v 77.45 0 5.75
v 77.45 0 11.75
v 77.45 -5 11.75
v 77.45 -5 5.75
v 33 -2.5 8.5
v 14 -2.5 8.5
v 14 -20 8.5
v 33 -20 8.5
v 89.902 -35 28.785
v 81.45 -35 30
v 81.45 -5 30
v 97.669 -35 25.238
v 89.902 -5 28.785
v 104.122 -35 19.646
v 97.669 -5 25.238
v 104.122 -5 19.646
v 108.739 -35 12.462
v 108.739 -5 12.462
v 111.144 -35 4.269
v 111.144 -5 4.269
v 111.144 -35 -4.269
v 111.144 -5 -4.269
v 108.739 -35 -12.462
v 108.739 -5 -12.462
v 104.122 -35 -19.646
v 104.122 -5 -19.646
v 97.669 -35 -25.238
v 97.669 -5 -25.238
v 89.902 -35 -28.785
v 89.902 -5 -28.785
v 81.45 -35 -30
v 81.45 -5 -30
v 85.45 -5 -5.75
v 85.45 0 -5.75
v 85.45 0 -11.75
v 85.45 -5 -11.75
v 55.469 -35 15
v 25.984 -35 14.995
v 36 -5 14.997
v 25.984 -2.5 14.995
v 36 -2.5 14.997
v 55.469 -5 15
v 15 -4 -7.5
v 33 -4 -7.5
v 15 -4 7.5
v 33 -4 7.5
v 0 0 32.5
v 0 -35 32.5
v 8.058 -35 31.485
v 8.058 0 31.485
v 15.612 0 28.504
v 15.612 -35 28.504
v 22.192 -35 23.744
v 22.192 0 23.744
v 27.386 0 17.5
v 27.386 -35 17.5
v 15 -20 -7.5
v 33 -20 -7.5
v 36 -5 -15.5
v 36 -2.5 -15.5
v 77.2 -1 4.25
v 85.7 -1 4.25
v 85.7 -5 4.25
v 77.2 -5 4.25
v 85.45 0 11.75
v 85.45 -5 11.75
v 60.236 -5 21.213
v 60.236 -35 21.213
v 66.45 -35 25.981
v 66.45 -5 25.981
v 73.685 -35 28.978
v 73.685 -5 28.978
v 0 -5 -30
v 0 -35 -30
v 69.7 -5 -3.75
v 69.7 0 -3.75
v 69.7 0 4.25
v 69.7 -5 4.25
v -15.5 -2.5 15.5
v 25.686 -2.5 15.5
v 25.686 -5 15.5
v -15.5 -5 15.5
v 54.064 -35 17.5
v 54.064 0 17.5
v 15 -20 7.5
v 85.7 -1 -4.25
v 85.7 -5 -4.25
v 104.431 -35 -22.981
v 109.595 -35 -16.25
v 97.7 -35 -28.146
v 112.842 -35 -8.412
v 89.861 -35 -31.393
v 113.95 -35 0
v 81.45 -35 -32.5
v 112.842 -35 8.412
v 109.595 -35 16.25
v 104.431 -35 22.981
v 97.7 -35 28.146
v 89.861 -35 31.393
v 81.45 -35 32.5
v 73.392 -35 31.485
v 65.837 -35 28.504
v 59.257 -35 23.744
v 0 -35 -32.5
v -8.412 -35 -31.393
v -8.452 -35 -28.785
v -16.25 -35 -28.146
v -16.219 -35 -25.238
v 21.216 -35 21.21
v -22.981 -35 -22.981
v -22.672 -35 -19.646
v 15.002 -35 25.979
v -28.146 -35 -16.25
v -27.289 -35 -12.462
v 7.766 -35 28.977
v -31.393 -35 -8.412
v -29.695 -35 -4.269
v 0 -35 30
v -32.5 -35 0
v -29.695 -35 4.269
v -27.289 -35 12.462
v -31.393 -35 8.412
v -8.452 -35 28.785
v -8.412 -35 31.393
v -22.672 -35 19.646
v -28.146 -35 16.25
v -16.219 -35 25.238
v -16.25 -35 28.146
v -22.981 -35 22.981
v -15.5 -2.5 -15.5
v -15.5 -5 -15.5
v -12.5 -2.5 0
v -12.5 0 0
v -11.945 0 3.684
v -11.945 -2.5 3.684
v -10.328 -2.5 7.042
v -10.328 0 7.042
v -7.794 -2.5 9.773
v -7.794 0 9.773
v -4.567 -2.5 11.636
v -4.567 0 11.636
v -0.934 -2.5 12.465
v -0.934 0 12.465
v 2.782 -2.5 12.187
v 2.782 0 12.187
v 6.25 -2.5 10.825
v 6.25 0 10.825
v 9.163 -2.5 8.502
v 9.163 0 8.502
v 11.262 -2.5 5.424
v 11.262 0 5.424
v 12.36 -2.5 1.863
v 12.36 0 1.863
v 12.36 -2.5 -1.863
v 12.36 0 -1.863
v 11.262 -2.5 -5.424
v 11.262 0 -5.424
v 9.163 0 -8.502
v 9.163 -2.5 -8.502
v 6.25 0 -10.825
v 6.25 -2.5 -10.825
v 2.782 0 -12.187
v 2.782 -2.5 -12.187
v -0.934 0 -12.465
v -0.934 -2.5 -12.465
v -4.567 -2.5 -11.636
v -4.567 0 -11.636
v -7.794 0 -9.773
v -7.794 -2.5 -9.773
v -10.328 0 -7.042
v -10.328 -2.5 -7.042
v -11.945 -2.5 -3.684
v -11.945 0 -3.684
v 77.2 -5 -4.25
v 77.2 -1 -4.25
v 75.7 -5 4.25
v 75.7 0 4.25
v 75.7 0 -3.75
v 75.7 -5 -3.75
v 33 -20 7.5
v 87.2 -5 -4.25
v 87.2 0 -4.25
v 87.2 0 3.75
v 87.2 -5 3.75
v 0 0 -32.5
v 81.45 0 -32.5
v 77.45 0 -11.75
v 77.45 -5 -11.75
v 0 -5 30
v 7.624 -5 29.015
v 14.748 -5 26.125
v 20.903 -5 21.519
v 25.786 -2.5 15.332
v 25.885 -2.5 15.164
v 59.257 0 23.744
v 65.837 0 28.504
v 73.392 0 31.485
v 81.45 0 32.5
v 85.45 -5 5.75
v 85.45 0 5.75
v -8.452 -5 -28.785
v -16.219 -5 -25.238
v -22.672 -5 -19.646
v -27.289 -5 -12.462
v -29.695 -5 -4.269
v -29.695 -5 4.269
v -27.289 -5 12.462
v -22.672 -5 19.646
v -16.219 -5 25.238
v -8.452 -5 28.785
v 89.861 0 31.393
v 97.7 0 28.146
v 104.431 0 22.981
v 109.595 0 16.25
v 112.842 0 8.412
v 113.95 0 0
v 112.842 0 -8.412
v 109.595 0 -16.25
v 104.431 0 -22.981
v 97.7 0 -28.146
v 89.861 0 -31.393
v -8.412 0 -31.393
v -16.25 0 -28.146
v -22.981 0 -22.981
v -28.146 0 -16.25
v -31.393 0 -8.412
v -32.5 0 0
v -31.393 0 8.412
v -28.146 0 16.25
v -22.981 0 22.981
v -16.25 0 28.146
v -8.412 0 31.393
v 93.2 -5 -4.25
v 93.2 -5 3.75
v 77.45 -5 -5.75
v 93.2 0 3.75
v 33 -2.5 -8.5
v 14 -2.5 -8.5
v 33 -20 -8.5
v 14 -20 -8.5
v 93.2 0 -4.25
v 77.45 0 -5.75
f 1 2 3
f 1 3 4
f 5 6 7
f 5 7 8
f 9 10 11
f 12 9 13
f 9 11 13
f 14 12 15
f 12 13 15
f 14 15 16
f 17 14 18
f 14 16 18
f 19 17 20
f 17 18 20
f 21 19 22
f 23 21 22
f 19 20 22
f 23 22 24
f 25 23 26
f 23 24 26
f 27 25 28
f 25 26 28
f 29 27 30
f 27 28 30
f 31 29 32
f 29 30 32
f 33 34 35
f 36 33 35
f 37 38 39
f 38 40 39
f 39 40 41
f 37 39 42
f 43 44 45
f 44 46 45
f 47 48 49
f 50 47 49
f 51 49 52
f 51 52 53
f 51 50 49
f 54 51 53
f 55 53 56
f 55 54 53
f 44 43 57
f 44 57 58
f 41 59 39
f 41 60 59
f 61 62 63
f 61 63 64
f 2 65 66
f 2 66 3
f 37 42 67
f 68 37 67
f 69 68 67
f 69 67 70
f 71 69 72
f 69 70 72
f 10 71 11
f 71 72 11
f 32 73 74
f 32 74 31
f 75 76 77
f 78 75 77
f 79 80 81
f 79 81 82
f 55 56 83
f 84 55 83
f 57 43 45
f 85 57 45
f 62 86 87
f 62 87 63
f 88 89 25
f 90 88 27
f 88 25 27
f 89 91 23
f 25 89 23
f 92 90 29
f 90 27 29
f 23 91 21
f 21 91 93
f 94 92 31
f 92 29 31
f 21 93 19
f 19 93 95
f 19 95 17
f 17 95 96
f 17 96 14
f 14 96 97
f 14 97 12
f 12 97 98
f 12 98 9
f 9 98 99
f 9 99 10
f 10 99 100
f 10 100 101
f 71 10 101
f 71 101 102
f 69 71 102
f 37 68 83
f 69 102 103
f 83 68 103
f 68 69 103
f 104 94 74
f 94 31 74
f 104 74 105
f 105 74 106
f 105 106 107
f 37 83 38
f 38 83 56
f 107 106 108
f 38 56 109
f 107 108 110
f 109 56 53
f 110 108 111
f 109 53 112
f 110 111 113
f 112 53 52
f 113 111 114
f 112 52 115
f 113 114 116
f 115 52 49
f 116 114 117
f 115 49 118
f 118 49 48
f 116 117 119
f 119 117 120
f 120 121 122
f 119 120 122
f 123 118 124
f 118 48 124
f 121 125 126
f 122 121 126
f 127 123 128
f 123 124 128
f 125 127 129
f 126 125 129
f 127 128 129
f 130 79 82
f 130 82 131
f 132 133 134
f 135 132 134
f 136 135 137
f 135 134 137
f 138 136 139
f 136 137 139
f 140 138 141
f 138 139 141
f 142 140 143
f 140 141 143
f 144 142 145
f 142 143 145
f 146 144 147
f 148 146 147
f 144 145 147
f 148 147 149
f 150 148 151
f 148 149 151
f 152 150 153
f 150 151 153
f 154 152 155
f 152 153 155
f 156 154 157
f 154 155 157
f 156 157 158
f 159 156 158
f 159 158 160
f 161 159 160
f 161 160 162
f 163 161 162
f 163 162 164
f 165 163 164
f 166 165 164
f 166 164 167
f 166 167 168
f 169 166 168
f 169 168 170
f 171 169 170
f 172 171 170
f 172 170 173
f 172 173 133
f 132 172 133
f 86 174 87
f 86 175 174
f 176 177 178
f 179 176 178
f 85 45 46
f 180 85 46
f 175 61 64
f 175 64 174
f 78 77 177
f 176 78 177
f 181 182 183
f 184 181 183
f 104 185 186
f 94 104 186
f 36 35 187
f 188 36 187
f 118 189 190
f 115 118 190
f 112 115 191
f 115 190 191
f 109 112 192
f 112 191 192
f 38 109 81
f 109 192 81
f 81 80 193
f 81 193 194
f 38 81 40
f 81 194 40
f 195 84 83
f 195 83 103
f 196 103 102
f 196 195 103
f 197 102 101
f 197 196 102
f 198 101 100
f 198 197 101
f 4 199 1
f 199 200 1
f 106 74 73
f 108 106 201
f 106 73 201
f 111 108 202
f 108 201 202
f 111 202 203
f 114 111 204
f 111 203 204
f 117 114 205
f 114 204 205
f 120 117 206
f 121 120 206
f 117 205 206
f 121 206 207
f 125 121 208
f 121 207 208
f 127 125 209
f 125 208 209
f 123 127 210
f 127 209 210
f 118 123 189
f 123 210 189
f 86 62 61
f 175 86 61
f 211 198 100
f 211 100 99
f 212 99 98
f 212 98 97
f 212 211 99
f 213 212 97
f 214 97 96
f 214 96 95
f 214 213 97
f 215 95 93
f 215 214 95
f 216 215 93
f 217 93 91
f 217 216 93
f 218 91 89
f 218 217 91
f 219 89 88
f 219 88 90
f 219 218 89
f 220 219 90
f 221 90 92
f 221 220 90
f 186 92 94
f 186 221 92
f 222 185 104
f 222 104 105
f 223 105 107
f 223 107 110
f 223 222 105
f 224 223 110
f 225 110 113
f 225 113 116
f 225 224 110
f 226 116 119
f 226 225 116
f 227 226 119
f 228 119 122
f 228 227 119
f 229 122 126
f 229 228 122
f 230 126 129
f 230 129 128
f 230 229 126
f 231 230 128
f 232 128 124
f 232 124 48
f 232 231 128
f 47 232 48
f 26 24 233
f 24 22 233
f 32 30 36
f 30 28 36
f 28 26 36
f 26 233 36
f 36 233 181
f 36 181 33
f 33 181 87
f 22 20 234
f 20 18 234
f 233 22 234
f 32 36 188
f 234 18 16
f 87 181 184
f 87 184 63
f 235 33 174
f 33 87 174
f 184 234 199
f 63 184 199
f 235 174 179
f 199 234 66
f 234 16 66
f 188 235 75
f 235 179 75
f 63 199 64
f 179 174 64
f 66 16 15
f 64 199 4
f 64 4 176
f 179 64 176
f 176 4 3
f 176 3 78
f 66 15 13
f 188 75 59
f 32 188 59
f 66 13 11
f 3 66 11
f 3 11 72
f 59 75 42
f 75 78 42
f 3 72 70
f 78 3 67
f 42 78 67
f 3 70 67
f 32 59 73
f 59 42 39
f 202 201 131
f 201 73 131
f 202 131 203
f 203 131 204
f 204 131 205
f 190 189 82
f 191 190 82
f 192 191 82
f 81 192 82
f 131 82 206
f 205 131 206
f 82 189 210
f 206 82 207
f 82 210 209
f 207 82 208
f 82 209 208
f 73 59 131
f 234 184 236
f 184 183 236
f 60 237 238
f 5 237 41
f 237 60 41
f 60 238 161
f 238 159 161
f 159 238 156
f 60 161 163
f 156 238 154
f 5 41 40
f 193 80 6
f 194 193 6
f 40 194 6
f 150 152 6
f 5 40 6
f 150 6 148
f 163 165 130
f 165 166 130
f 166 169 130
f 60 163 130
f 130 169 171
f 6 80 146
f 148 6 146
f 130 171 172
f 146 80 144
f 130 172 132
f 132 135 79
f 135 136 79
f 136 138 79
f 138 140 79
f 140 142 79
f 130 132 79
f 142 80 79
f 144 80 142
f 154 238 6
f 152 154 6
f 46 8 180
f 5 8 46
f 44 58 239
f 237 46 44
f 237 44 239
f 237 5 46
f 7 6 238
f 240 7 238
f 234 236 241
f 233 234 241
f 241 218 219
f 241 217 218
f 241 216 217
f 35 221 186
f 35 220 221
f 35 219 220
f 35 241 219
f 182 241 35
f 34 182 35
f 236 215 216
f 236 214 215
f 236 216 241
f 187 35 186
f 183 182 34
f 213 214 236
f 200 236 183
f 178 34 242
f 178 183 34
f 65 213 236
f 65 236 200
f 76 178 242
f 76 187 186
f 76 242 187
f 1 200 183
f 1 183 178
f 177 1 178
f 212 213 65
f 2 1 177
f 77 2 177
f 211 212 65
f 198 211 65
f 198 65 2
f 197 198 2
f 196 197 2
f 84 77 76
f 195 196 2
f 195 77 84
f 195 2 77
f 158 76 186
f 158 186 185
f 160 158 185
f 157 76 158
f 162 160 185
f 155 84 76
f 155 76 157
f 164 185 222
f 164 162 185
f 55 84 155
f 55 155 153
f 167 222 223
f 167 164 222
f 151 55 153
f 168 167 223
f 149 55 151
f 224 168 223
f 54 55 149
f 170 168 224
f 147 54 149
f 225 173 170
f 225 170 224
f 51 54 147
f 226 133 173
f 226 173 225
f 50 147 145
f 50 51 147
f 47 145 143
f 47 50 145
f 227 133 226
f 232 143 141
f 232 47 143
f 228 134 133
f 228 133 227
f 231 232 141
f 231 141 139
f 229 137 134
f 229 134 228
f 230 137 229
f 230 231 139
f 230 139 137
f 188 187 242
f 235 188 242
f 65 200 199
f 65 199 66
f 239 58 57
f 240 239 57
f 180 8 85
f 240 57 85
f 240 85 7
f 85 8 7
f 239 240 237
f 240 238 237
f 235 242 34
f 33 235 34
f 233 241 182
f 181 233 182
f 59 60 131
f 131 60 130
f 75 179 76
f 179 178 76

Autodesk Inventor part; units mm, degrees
ref_plane "YZ Plane" through (0, 0, 0) normal (1, 0, 0) x (0, 1, 0)
ref_plane "XZ Plane" through (0, 0, 0) normal (0, 1, 0) x (-1, 0, 0)
ref_plane "XY Plane" through (0, 0, 0) normal (0, 0, 1) x (1, 0, 0)
sketch "Sketch1" plane through (0, 0, 0) normal (0, 1, 0) x (-1, 0, 0)
  circle A0 centre (0, 0) radius 30 construction
  circle A1 centre (0, 0) radius 32.5 construction
  line L0 (0, -30) -> (-81.4496, -30) construction
  circle A2 centre (-81.4496, 0) radius 30 construction
  circle A3 centre (-81.4496, 0) radius 32.5 construction
  line L1 (0, -32.5) -> (-81.4496, -32.5) construction
  line L2 (0, 32.5) -> (-81.4496, 32.5) construction
  line L3 (0, 30) -> (-81.4496, 30) construction
  line L4 (-40.7248, -32.5) -> (-40.7248, 32.5) construction
  line L5 (-40.7248, 30) -> (-40.7248, 14.2852) construction
  line L6 (-81.4496, -30) -> (-81.4496, 30) construction
  line L7 (-40.7248, 14.2852) -> (-40.7248, 16.7852) construction
  arc A4 (0, -30) -> (30, 0) centre (0, 0) ccw
  arc A5 (30, 0) -> (0, 30) centre (0, 0) ccw
  arc A6 (-111.4496, 0) -> (-81.4496, -30) centre (-81.4496, 0) ccw
  arc A7 (-81.4496, 30) -> (-111.4496, 0) centre (-81.4496, 0) ccw
  arc A8 (0, -32.5) -> (32.5, 0) centre (0, 0) ccw
  arc A9 (32.5, 0) -> (0, 32.5) centre (0, 0) ccw
  arc A10 (-81.4496, 32.5) -> (-113.9496, 0) centre (-81.4496, 0) ccw
  arc A11 (-113.9496, 0) -> (-81.4496, -32.5) centre (-81.4496, 0) ccw
  line L8 (0, -30) -> (-81.4496, -30)
  line L9 (0, -32.5) -> (-81.4496, -32.5)
  line L10 (-40.7248, -30) -> (-40.7248, 15) construction
  line L11 (-40.7248, 15) -> (-28.8314, 15) construction
  line L12 (-40.7248, 15) -> (-52.6182, 15) construction
  line L13 (-40.7248, 15) -> (-40.7248, 17.5) construction
  line L14 (-40.7248, 17.5) -> (-27.3861, 17.5)
  line L15 (-40.7248, 17.5) -> (-54.0635, 17.5)
  line L16 (-52.6182, 15) -> (-55.4688, 15) construction
  line L17 (-28.8314, 15) -> (-25.9836, 15) construction
  arc A12 (0, 30) -> (-25.9836, 14.9951) centre (0, 0) ccw
  arc A13 (-55.4688, 15) -> (-81.4496, 30) centre (-81.4496, 0) ccw
  line L18 (-25.9836, 14.9951) -> (-55.4688, 15)
  arc A14 (0, 32.5) -> (-27.3861, 17.5) centre (0, 0) ccw
  arc A15 (-54.0635, 17.5) -> (-81.4496, 32.5) centre (-81.4496, 0) ccw
  circle A16 centre (0, 0) radius 12.5
  line L19 (-81.4496, 0) -> (-81.4496, -4.25) construction
  line L20 (-81.4496, 0) -> (-81.4496, 4.25) construction
  line L21 (-81.4496, 0) -> (-77.1996, 0) construction
  line L22 (-81.4496, 0) -> (-85.6996, 0) construction
  line L23 (-77.1996, 0) -> (-77.1996, -4.25)
  line L24 (-77.1996, -4.25) -> (-85.6996, -4.25)
  line L25 (-85.6996, -4.25) -> (-85.6996, 4.25)
  line L26 (-85.6996, 4.25) -> (-77.1996, 4.25)
  line L27 (-77.1996, 4.25) -> (-77.1996, 0)
  line L28 (-81.4496, -4.25) -> (-81.4496, -5.75) construction
  line L29 (-85.6996, 0) -> (-87.1996, 0) construction
  line L30 (-81.4496, 4.25) -> (-81.4496, 5.75) construction
  line L31 (-77.1996, 0) -> (-75.6996, 0) construction
  line L32 (-77.1996, 4.25) -> (-75.6996, 4.25) construction
  line L33 (-75.6996, 4.25) -> (-75.6996, -3.75)
  line L34 (-75.6996, -3.75) -> (-69.6996, -3.75)
  line L35 (-69.6996, -3.75) -> (-69.6996, 4.25)
  line L36 (-69.6996, 4.25) -> (-75.6996, 4.25)
  line L37 (-87.1996, -4.25) -> (-87.1996, 3.75)
  line L38 (-87.1996, 3.75) -> (-93.1996, 3.75)
  line L39 (-93.1996, 3.75) -> (-93.1996, -4.25)
  line L40 (-93.1996, -4.25) -> (-87.1996, -4.25)
  line L41 (-81.4496, -5.75) -> (-77.4496, -5.75)
  line L42 (-81.4496, -5.75) -> (-85.4496, -5.75)
  line L43 (-85.4496, -5.75) -> (-85.4496, -11.75)
  line L44 (-85.4496, -11.75) -> (-77.4496, -11.75)
  line L45 (-77.4496, -11.75) -> (-77.4496, -5.75)
  line L46 (-81.4496, 5.75) -> (-77.4496, 5.75)
  line L47 (-81.4496, 5.75) -> (-85.4496, 5.75)
  line L48 (-85.4496, 5.75) -> (-85.4496, 11.75)
  line L49 (-85.4496, 11.75) -> (-77.4496, 11.75)
  line L50 (-77.4496, 11.75) -> (-77.4496, 5.75)
  line L51 (0, 0) -> (-16, 0) construction
  line L52 (0, 0) -> (-15, 0) construction
  line L53 (0, 0) -> (-14, 0) construction
  line L54 (0, 12.5) -> (-16, 12.5) construction
  line L55 (0, -12.5) -> (-16, -12.5) construction
  line L56 (-15, 0) -> (-15, 12.5) construction
  line L57 (-15, 0) -> (-15, -12.5) construction
  line L58 (-14, 0) -> (-14, -12.5) construction
  line L59 (-14, 0) -> (-14, 12.5) construction
  line L60 (-16, 12.5) -> (-16, 0) construction
  line L61 (-16, 0) -> (-16, -12.5) construction
  line L62 (-16, -12.5) -> (-16, -8.5) construction
  line L63 (-16, 12.5) -> (-16, 8.5) construction
  line L64 (-14, -12.5) -> (-14, -8.5) construction
  line L65 (-14, 12.5) -> (-14, 8.5) construction
  line L66 (-14, -8.5) -> (-33, -8.5)
  line L67 (-14, 8.5) -> (-14, -8.5)
  line L68 (-14, -12.5) -> (-14, -7.5) construction
  line L69 (-14, 12.5) -> (-14, 7.5) construction
  line L70 (-15, -7.5) -> (-15, 7.5)
  line L71 (-14, 8.5) -> (-33, 8.5)
  line L72 (-33, 7.5) -> (-33, 8.5)
  line L73 (-15, 7.5) -> (-33, 7.5)
  line L74 (-15, -7.5) -> (-33, -7.5)
  line L75 (-33, -7.5) -> (-33, -8.5)
  line L76 (-33, -7.5) -> (-33, 7.5)
  line L77 (0, -12.5) -> (0, -15.5) construction
  line L78 (0, 12.5) -> (0, 15.5) construction
  line L79 (12.5, 0) -> (15.5, 0) construction
  line L80 (15.5, 0) -> (15.5, -15.5)
  line L81 (15.5, -15.5) -> (0, -15.5)
  line L82 (0, 15.5) -> (15.5, 15.5)
  line L83 (15.5, 15.5) -> (15.5, 0)
  line L84 (-33, 0) -> (-36, 0) construction
  line L85 (-36, 0) -> (-36, -15.5)
  line L86 (-36, -15.5) -> (0, -15.5)
  line L87 (15.5, 15.5) -> (-25.6856, 15.5)
  line L88 (-36, 0) -> (-36, 14.9967)
  point P0 (-81.4496, -4.25)
  point P1 (-79.4496, 5.75)
  dimension "d0" = 60
  dimension "d1" = 65
  dimension "d2" = 81.4496
  dimension "d3" = 60
  dimension "d4" = 65
  dimension "d7" = 2.5
  dimension "d10" = 2.5
  dimension "d12" = 25
  dimension "d13" = 81.4496
  dimension "d14" = 2.5
  dimension "d15" = 4.25
  dimension "d16" = 4.25
  dimension "d17" = 4.25
  dimension "d18" = 4.25
  dimension "d21" = 1.5
  dimension "d23" = 8
  dimension "d24" = 6
  dimension "d25" = 50
  dimension "d26" = 45
  dimension "d27" = 25.75
  dimension "d28" = 25.75
  dimension "d29" = 8
  dimension "d30" = 6
  dimension "d32" = 4
  dimension "d33" = 4
  dimension "d34" = 6
  dimension "d35" = 4
  dimension "d36" = 4
  dimension "d37" = 6
  dimension "d38" = 1.5
  dimension "d40" = 1.5
  dimension "d41" = 1.5
  dimension "d42" = 1.5
  dimension "d43" = 8
  dimension "d44" = 16
  dimension "d45" = 15
  dimension "d46" = 14
  dimension "d49" = 4
  dimension "d50" = 4
  dimension "d51" = 19
  dimension "d53" = 5
  dimension "d54" = 5
  dimension "d55" = 19
  dimension "d56" = 18
  dimension "d57" = 18
  dimension "d58" = 15
  dimension "d59" = 3
  dimension "d60" = 3
  dimension "d61" = 3
  dimension "d62" = 3
extrude "Extrusion1" add sketch "Sketch1" against normal blind 35 contours L9 A11 A10 A15 L15 L14 A14 A9 A8
extrude "Extrusion2" add sketch "Sketch1" against normal blind 2.5 contours L87 L82 L83 L80 L81 L86 L85 L88 L18 A12
extrude "Extrusion3" add sketch "Sketch1" against normal blind 4 contours L76 L73 L70 L74
extrude "Extrusion4" add sketch "Sketch1" against normal blind 20 contours L66 L75 L74 L70 L73 L72 L71 L67
extrude "Extrusion5" add sketch "Sketch1" against normal blind 5 contours L8 A6 A7 A13 L18 L88 L85 L86 L81 L80 L83 L82 L87 A12 A5 A4
extrude "Extrusion6" add sketch "Sketch1" against normal blind 1 contours L23 L24 L25 L26 L27
properties part number "controller_v9_d1_3DPrint"
